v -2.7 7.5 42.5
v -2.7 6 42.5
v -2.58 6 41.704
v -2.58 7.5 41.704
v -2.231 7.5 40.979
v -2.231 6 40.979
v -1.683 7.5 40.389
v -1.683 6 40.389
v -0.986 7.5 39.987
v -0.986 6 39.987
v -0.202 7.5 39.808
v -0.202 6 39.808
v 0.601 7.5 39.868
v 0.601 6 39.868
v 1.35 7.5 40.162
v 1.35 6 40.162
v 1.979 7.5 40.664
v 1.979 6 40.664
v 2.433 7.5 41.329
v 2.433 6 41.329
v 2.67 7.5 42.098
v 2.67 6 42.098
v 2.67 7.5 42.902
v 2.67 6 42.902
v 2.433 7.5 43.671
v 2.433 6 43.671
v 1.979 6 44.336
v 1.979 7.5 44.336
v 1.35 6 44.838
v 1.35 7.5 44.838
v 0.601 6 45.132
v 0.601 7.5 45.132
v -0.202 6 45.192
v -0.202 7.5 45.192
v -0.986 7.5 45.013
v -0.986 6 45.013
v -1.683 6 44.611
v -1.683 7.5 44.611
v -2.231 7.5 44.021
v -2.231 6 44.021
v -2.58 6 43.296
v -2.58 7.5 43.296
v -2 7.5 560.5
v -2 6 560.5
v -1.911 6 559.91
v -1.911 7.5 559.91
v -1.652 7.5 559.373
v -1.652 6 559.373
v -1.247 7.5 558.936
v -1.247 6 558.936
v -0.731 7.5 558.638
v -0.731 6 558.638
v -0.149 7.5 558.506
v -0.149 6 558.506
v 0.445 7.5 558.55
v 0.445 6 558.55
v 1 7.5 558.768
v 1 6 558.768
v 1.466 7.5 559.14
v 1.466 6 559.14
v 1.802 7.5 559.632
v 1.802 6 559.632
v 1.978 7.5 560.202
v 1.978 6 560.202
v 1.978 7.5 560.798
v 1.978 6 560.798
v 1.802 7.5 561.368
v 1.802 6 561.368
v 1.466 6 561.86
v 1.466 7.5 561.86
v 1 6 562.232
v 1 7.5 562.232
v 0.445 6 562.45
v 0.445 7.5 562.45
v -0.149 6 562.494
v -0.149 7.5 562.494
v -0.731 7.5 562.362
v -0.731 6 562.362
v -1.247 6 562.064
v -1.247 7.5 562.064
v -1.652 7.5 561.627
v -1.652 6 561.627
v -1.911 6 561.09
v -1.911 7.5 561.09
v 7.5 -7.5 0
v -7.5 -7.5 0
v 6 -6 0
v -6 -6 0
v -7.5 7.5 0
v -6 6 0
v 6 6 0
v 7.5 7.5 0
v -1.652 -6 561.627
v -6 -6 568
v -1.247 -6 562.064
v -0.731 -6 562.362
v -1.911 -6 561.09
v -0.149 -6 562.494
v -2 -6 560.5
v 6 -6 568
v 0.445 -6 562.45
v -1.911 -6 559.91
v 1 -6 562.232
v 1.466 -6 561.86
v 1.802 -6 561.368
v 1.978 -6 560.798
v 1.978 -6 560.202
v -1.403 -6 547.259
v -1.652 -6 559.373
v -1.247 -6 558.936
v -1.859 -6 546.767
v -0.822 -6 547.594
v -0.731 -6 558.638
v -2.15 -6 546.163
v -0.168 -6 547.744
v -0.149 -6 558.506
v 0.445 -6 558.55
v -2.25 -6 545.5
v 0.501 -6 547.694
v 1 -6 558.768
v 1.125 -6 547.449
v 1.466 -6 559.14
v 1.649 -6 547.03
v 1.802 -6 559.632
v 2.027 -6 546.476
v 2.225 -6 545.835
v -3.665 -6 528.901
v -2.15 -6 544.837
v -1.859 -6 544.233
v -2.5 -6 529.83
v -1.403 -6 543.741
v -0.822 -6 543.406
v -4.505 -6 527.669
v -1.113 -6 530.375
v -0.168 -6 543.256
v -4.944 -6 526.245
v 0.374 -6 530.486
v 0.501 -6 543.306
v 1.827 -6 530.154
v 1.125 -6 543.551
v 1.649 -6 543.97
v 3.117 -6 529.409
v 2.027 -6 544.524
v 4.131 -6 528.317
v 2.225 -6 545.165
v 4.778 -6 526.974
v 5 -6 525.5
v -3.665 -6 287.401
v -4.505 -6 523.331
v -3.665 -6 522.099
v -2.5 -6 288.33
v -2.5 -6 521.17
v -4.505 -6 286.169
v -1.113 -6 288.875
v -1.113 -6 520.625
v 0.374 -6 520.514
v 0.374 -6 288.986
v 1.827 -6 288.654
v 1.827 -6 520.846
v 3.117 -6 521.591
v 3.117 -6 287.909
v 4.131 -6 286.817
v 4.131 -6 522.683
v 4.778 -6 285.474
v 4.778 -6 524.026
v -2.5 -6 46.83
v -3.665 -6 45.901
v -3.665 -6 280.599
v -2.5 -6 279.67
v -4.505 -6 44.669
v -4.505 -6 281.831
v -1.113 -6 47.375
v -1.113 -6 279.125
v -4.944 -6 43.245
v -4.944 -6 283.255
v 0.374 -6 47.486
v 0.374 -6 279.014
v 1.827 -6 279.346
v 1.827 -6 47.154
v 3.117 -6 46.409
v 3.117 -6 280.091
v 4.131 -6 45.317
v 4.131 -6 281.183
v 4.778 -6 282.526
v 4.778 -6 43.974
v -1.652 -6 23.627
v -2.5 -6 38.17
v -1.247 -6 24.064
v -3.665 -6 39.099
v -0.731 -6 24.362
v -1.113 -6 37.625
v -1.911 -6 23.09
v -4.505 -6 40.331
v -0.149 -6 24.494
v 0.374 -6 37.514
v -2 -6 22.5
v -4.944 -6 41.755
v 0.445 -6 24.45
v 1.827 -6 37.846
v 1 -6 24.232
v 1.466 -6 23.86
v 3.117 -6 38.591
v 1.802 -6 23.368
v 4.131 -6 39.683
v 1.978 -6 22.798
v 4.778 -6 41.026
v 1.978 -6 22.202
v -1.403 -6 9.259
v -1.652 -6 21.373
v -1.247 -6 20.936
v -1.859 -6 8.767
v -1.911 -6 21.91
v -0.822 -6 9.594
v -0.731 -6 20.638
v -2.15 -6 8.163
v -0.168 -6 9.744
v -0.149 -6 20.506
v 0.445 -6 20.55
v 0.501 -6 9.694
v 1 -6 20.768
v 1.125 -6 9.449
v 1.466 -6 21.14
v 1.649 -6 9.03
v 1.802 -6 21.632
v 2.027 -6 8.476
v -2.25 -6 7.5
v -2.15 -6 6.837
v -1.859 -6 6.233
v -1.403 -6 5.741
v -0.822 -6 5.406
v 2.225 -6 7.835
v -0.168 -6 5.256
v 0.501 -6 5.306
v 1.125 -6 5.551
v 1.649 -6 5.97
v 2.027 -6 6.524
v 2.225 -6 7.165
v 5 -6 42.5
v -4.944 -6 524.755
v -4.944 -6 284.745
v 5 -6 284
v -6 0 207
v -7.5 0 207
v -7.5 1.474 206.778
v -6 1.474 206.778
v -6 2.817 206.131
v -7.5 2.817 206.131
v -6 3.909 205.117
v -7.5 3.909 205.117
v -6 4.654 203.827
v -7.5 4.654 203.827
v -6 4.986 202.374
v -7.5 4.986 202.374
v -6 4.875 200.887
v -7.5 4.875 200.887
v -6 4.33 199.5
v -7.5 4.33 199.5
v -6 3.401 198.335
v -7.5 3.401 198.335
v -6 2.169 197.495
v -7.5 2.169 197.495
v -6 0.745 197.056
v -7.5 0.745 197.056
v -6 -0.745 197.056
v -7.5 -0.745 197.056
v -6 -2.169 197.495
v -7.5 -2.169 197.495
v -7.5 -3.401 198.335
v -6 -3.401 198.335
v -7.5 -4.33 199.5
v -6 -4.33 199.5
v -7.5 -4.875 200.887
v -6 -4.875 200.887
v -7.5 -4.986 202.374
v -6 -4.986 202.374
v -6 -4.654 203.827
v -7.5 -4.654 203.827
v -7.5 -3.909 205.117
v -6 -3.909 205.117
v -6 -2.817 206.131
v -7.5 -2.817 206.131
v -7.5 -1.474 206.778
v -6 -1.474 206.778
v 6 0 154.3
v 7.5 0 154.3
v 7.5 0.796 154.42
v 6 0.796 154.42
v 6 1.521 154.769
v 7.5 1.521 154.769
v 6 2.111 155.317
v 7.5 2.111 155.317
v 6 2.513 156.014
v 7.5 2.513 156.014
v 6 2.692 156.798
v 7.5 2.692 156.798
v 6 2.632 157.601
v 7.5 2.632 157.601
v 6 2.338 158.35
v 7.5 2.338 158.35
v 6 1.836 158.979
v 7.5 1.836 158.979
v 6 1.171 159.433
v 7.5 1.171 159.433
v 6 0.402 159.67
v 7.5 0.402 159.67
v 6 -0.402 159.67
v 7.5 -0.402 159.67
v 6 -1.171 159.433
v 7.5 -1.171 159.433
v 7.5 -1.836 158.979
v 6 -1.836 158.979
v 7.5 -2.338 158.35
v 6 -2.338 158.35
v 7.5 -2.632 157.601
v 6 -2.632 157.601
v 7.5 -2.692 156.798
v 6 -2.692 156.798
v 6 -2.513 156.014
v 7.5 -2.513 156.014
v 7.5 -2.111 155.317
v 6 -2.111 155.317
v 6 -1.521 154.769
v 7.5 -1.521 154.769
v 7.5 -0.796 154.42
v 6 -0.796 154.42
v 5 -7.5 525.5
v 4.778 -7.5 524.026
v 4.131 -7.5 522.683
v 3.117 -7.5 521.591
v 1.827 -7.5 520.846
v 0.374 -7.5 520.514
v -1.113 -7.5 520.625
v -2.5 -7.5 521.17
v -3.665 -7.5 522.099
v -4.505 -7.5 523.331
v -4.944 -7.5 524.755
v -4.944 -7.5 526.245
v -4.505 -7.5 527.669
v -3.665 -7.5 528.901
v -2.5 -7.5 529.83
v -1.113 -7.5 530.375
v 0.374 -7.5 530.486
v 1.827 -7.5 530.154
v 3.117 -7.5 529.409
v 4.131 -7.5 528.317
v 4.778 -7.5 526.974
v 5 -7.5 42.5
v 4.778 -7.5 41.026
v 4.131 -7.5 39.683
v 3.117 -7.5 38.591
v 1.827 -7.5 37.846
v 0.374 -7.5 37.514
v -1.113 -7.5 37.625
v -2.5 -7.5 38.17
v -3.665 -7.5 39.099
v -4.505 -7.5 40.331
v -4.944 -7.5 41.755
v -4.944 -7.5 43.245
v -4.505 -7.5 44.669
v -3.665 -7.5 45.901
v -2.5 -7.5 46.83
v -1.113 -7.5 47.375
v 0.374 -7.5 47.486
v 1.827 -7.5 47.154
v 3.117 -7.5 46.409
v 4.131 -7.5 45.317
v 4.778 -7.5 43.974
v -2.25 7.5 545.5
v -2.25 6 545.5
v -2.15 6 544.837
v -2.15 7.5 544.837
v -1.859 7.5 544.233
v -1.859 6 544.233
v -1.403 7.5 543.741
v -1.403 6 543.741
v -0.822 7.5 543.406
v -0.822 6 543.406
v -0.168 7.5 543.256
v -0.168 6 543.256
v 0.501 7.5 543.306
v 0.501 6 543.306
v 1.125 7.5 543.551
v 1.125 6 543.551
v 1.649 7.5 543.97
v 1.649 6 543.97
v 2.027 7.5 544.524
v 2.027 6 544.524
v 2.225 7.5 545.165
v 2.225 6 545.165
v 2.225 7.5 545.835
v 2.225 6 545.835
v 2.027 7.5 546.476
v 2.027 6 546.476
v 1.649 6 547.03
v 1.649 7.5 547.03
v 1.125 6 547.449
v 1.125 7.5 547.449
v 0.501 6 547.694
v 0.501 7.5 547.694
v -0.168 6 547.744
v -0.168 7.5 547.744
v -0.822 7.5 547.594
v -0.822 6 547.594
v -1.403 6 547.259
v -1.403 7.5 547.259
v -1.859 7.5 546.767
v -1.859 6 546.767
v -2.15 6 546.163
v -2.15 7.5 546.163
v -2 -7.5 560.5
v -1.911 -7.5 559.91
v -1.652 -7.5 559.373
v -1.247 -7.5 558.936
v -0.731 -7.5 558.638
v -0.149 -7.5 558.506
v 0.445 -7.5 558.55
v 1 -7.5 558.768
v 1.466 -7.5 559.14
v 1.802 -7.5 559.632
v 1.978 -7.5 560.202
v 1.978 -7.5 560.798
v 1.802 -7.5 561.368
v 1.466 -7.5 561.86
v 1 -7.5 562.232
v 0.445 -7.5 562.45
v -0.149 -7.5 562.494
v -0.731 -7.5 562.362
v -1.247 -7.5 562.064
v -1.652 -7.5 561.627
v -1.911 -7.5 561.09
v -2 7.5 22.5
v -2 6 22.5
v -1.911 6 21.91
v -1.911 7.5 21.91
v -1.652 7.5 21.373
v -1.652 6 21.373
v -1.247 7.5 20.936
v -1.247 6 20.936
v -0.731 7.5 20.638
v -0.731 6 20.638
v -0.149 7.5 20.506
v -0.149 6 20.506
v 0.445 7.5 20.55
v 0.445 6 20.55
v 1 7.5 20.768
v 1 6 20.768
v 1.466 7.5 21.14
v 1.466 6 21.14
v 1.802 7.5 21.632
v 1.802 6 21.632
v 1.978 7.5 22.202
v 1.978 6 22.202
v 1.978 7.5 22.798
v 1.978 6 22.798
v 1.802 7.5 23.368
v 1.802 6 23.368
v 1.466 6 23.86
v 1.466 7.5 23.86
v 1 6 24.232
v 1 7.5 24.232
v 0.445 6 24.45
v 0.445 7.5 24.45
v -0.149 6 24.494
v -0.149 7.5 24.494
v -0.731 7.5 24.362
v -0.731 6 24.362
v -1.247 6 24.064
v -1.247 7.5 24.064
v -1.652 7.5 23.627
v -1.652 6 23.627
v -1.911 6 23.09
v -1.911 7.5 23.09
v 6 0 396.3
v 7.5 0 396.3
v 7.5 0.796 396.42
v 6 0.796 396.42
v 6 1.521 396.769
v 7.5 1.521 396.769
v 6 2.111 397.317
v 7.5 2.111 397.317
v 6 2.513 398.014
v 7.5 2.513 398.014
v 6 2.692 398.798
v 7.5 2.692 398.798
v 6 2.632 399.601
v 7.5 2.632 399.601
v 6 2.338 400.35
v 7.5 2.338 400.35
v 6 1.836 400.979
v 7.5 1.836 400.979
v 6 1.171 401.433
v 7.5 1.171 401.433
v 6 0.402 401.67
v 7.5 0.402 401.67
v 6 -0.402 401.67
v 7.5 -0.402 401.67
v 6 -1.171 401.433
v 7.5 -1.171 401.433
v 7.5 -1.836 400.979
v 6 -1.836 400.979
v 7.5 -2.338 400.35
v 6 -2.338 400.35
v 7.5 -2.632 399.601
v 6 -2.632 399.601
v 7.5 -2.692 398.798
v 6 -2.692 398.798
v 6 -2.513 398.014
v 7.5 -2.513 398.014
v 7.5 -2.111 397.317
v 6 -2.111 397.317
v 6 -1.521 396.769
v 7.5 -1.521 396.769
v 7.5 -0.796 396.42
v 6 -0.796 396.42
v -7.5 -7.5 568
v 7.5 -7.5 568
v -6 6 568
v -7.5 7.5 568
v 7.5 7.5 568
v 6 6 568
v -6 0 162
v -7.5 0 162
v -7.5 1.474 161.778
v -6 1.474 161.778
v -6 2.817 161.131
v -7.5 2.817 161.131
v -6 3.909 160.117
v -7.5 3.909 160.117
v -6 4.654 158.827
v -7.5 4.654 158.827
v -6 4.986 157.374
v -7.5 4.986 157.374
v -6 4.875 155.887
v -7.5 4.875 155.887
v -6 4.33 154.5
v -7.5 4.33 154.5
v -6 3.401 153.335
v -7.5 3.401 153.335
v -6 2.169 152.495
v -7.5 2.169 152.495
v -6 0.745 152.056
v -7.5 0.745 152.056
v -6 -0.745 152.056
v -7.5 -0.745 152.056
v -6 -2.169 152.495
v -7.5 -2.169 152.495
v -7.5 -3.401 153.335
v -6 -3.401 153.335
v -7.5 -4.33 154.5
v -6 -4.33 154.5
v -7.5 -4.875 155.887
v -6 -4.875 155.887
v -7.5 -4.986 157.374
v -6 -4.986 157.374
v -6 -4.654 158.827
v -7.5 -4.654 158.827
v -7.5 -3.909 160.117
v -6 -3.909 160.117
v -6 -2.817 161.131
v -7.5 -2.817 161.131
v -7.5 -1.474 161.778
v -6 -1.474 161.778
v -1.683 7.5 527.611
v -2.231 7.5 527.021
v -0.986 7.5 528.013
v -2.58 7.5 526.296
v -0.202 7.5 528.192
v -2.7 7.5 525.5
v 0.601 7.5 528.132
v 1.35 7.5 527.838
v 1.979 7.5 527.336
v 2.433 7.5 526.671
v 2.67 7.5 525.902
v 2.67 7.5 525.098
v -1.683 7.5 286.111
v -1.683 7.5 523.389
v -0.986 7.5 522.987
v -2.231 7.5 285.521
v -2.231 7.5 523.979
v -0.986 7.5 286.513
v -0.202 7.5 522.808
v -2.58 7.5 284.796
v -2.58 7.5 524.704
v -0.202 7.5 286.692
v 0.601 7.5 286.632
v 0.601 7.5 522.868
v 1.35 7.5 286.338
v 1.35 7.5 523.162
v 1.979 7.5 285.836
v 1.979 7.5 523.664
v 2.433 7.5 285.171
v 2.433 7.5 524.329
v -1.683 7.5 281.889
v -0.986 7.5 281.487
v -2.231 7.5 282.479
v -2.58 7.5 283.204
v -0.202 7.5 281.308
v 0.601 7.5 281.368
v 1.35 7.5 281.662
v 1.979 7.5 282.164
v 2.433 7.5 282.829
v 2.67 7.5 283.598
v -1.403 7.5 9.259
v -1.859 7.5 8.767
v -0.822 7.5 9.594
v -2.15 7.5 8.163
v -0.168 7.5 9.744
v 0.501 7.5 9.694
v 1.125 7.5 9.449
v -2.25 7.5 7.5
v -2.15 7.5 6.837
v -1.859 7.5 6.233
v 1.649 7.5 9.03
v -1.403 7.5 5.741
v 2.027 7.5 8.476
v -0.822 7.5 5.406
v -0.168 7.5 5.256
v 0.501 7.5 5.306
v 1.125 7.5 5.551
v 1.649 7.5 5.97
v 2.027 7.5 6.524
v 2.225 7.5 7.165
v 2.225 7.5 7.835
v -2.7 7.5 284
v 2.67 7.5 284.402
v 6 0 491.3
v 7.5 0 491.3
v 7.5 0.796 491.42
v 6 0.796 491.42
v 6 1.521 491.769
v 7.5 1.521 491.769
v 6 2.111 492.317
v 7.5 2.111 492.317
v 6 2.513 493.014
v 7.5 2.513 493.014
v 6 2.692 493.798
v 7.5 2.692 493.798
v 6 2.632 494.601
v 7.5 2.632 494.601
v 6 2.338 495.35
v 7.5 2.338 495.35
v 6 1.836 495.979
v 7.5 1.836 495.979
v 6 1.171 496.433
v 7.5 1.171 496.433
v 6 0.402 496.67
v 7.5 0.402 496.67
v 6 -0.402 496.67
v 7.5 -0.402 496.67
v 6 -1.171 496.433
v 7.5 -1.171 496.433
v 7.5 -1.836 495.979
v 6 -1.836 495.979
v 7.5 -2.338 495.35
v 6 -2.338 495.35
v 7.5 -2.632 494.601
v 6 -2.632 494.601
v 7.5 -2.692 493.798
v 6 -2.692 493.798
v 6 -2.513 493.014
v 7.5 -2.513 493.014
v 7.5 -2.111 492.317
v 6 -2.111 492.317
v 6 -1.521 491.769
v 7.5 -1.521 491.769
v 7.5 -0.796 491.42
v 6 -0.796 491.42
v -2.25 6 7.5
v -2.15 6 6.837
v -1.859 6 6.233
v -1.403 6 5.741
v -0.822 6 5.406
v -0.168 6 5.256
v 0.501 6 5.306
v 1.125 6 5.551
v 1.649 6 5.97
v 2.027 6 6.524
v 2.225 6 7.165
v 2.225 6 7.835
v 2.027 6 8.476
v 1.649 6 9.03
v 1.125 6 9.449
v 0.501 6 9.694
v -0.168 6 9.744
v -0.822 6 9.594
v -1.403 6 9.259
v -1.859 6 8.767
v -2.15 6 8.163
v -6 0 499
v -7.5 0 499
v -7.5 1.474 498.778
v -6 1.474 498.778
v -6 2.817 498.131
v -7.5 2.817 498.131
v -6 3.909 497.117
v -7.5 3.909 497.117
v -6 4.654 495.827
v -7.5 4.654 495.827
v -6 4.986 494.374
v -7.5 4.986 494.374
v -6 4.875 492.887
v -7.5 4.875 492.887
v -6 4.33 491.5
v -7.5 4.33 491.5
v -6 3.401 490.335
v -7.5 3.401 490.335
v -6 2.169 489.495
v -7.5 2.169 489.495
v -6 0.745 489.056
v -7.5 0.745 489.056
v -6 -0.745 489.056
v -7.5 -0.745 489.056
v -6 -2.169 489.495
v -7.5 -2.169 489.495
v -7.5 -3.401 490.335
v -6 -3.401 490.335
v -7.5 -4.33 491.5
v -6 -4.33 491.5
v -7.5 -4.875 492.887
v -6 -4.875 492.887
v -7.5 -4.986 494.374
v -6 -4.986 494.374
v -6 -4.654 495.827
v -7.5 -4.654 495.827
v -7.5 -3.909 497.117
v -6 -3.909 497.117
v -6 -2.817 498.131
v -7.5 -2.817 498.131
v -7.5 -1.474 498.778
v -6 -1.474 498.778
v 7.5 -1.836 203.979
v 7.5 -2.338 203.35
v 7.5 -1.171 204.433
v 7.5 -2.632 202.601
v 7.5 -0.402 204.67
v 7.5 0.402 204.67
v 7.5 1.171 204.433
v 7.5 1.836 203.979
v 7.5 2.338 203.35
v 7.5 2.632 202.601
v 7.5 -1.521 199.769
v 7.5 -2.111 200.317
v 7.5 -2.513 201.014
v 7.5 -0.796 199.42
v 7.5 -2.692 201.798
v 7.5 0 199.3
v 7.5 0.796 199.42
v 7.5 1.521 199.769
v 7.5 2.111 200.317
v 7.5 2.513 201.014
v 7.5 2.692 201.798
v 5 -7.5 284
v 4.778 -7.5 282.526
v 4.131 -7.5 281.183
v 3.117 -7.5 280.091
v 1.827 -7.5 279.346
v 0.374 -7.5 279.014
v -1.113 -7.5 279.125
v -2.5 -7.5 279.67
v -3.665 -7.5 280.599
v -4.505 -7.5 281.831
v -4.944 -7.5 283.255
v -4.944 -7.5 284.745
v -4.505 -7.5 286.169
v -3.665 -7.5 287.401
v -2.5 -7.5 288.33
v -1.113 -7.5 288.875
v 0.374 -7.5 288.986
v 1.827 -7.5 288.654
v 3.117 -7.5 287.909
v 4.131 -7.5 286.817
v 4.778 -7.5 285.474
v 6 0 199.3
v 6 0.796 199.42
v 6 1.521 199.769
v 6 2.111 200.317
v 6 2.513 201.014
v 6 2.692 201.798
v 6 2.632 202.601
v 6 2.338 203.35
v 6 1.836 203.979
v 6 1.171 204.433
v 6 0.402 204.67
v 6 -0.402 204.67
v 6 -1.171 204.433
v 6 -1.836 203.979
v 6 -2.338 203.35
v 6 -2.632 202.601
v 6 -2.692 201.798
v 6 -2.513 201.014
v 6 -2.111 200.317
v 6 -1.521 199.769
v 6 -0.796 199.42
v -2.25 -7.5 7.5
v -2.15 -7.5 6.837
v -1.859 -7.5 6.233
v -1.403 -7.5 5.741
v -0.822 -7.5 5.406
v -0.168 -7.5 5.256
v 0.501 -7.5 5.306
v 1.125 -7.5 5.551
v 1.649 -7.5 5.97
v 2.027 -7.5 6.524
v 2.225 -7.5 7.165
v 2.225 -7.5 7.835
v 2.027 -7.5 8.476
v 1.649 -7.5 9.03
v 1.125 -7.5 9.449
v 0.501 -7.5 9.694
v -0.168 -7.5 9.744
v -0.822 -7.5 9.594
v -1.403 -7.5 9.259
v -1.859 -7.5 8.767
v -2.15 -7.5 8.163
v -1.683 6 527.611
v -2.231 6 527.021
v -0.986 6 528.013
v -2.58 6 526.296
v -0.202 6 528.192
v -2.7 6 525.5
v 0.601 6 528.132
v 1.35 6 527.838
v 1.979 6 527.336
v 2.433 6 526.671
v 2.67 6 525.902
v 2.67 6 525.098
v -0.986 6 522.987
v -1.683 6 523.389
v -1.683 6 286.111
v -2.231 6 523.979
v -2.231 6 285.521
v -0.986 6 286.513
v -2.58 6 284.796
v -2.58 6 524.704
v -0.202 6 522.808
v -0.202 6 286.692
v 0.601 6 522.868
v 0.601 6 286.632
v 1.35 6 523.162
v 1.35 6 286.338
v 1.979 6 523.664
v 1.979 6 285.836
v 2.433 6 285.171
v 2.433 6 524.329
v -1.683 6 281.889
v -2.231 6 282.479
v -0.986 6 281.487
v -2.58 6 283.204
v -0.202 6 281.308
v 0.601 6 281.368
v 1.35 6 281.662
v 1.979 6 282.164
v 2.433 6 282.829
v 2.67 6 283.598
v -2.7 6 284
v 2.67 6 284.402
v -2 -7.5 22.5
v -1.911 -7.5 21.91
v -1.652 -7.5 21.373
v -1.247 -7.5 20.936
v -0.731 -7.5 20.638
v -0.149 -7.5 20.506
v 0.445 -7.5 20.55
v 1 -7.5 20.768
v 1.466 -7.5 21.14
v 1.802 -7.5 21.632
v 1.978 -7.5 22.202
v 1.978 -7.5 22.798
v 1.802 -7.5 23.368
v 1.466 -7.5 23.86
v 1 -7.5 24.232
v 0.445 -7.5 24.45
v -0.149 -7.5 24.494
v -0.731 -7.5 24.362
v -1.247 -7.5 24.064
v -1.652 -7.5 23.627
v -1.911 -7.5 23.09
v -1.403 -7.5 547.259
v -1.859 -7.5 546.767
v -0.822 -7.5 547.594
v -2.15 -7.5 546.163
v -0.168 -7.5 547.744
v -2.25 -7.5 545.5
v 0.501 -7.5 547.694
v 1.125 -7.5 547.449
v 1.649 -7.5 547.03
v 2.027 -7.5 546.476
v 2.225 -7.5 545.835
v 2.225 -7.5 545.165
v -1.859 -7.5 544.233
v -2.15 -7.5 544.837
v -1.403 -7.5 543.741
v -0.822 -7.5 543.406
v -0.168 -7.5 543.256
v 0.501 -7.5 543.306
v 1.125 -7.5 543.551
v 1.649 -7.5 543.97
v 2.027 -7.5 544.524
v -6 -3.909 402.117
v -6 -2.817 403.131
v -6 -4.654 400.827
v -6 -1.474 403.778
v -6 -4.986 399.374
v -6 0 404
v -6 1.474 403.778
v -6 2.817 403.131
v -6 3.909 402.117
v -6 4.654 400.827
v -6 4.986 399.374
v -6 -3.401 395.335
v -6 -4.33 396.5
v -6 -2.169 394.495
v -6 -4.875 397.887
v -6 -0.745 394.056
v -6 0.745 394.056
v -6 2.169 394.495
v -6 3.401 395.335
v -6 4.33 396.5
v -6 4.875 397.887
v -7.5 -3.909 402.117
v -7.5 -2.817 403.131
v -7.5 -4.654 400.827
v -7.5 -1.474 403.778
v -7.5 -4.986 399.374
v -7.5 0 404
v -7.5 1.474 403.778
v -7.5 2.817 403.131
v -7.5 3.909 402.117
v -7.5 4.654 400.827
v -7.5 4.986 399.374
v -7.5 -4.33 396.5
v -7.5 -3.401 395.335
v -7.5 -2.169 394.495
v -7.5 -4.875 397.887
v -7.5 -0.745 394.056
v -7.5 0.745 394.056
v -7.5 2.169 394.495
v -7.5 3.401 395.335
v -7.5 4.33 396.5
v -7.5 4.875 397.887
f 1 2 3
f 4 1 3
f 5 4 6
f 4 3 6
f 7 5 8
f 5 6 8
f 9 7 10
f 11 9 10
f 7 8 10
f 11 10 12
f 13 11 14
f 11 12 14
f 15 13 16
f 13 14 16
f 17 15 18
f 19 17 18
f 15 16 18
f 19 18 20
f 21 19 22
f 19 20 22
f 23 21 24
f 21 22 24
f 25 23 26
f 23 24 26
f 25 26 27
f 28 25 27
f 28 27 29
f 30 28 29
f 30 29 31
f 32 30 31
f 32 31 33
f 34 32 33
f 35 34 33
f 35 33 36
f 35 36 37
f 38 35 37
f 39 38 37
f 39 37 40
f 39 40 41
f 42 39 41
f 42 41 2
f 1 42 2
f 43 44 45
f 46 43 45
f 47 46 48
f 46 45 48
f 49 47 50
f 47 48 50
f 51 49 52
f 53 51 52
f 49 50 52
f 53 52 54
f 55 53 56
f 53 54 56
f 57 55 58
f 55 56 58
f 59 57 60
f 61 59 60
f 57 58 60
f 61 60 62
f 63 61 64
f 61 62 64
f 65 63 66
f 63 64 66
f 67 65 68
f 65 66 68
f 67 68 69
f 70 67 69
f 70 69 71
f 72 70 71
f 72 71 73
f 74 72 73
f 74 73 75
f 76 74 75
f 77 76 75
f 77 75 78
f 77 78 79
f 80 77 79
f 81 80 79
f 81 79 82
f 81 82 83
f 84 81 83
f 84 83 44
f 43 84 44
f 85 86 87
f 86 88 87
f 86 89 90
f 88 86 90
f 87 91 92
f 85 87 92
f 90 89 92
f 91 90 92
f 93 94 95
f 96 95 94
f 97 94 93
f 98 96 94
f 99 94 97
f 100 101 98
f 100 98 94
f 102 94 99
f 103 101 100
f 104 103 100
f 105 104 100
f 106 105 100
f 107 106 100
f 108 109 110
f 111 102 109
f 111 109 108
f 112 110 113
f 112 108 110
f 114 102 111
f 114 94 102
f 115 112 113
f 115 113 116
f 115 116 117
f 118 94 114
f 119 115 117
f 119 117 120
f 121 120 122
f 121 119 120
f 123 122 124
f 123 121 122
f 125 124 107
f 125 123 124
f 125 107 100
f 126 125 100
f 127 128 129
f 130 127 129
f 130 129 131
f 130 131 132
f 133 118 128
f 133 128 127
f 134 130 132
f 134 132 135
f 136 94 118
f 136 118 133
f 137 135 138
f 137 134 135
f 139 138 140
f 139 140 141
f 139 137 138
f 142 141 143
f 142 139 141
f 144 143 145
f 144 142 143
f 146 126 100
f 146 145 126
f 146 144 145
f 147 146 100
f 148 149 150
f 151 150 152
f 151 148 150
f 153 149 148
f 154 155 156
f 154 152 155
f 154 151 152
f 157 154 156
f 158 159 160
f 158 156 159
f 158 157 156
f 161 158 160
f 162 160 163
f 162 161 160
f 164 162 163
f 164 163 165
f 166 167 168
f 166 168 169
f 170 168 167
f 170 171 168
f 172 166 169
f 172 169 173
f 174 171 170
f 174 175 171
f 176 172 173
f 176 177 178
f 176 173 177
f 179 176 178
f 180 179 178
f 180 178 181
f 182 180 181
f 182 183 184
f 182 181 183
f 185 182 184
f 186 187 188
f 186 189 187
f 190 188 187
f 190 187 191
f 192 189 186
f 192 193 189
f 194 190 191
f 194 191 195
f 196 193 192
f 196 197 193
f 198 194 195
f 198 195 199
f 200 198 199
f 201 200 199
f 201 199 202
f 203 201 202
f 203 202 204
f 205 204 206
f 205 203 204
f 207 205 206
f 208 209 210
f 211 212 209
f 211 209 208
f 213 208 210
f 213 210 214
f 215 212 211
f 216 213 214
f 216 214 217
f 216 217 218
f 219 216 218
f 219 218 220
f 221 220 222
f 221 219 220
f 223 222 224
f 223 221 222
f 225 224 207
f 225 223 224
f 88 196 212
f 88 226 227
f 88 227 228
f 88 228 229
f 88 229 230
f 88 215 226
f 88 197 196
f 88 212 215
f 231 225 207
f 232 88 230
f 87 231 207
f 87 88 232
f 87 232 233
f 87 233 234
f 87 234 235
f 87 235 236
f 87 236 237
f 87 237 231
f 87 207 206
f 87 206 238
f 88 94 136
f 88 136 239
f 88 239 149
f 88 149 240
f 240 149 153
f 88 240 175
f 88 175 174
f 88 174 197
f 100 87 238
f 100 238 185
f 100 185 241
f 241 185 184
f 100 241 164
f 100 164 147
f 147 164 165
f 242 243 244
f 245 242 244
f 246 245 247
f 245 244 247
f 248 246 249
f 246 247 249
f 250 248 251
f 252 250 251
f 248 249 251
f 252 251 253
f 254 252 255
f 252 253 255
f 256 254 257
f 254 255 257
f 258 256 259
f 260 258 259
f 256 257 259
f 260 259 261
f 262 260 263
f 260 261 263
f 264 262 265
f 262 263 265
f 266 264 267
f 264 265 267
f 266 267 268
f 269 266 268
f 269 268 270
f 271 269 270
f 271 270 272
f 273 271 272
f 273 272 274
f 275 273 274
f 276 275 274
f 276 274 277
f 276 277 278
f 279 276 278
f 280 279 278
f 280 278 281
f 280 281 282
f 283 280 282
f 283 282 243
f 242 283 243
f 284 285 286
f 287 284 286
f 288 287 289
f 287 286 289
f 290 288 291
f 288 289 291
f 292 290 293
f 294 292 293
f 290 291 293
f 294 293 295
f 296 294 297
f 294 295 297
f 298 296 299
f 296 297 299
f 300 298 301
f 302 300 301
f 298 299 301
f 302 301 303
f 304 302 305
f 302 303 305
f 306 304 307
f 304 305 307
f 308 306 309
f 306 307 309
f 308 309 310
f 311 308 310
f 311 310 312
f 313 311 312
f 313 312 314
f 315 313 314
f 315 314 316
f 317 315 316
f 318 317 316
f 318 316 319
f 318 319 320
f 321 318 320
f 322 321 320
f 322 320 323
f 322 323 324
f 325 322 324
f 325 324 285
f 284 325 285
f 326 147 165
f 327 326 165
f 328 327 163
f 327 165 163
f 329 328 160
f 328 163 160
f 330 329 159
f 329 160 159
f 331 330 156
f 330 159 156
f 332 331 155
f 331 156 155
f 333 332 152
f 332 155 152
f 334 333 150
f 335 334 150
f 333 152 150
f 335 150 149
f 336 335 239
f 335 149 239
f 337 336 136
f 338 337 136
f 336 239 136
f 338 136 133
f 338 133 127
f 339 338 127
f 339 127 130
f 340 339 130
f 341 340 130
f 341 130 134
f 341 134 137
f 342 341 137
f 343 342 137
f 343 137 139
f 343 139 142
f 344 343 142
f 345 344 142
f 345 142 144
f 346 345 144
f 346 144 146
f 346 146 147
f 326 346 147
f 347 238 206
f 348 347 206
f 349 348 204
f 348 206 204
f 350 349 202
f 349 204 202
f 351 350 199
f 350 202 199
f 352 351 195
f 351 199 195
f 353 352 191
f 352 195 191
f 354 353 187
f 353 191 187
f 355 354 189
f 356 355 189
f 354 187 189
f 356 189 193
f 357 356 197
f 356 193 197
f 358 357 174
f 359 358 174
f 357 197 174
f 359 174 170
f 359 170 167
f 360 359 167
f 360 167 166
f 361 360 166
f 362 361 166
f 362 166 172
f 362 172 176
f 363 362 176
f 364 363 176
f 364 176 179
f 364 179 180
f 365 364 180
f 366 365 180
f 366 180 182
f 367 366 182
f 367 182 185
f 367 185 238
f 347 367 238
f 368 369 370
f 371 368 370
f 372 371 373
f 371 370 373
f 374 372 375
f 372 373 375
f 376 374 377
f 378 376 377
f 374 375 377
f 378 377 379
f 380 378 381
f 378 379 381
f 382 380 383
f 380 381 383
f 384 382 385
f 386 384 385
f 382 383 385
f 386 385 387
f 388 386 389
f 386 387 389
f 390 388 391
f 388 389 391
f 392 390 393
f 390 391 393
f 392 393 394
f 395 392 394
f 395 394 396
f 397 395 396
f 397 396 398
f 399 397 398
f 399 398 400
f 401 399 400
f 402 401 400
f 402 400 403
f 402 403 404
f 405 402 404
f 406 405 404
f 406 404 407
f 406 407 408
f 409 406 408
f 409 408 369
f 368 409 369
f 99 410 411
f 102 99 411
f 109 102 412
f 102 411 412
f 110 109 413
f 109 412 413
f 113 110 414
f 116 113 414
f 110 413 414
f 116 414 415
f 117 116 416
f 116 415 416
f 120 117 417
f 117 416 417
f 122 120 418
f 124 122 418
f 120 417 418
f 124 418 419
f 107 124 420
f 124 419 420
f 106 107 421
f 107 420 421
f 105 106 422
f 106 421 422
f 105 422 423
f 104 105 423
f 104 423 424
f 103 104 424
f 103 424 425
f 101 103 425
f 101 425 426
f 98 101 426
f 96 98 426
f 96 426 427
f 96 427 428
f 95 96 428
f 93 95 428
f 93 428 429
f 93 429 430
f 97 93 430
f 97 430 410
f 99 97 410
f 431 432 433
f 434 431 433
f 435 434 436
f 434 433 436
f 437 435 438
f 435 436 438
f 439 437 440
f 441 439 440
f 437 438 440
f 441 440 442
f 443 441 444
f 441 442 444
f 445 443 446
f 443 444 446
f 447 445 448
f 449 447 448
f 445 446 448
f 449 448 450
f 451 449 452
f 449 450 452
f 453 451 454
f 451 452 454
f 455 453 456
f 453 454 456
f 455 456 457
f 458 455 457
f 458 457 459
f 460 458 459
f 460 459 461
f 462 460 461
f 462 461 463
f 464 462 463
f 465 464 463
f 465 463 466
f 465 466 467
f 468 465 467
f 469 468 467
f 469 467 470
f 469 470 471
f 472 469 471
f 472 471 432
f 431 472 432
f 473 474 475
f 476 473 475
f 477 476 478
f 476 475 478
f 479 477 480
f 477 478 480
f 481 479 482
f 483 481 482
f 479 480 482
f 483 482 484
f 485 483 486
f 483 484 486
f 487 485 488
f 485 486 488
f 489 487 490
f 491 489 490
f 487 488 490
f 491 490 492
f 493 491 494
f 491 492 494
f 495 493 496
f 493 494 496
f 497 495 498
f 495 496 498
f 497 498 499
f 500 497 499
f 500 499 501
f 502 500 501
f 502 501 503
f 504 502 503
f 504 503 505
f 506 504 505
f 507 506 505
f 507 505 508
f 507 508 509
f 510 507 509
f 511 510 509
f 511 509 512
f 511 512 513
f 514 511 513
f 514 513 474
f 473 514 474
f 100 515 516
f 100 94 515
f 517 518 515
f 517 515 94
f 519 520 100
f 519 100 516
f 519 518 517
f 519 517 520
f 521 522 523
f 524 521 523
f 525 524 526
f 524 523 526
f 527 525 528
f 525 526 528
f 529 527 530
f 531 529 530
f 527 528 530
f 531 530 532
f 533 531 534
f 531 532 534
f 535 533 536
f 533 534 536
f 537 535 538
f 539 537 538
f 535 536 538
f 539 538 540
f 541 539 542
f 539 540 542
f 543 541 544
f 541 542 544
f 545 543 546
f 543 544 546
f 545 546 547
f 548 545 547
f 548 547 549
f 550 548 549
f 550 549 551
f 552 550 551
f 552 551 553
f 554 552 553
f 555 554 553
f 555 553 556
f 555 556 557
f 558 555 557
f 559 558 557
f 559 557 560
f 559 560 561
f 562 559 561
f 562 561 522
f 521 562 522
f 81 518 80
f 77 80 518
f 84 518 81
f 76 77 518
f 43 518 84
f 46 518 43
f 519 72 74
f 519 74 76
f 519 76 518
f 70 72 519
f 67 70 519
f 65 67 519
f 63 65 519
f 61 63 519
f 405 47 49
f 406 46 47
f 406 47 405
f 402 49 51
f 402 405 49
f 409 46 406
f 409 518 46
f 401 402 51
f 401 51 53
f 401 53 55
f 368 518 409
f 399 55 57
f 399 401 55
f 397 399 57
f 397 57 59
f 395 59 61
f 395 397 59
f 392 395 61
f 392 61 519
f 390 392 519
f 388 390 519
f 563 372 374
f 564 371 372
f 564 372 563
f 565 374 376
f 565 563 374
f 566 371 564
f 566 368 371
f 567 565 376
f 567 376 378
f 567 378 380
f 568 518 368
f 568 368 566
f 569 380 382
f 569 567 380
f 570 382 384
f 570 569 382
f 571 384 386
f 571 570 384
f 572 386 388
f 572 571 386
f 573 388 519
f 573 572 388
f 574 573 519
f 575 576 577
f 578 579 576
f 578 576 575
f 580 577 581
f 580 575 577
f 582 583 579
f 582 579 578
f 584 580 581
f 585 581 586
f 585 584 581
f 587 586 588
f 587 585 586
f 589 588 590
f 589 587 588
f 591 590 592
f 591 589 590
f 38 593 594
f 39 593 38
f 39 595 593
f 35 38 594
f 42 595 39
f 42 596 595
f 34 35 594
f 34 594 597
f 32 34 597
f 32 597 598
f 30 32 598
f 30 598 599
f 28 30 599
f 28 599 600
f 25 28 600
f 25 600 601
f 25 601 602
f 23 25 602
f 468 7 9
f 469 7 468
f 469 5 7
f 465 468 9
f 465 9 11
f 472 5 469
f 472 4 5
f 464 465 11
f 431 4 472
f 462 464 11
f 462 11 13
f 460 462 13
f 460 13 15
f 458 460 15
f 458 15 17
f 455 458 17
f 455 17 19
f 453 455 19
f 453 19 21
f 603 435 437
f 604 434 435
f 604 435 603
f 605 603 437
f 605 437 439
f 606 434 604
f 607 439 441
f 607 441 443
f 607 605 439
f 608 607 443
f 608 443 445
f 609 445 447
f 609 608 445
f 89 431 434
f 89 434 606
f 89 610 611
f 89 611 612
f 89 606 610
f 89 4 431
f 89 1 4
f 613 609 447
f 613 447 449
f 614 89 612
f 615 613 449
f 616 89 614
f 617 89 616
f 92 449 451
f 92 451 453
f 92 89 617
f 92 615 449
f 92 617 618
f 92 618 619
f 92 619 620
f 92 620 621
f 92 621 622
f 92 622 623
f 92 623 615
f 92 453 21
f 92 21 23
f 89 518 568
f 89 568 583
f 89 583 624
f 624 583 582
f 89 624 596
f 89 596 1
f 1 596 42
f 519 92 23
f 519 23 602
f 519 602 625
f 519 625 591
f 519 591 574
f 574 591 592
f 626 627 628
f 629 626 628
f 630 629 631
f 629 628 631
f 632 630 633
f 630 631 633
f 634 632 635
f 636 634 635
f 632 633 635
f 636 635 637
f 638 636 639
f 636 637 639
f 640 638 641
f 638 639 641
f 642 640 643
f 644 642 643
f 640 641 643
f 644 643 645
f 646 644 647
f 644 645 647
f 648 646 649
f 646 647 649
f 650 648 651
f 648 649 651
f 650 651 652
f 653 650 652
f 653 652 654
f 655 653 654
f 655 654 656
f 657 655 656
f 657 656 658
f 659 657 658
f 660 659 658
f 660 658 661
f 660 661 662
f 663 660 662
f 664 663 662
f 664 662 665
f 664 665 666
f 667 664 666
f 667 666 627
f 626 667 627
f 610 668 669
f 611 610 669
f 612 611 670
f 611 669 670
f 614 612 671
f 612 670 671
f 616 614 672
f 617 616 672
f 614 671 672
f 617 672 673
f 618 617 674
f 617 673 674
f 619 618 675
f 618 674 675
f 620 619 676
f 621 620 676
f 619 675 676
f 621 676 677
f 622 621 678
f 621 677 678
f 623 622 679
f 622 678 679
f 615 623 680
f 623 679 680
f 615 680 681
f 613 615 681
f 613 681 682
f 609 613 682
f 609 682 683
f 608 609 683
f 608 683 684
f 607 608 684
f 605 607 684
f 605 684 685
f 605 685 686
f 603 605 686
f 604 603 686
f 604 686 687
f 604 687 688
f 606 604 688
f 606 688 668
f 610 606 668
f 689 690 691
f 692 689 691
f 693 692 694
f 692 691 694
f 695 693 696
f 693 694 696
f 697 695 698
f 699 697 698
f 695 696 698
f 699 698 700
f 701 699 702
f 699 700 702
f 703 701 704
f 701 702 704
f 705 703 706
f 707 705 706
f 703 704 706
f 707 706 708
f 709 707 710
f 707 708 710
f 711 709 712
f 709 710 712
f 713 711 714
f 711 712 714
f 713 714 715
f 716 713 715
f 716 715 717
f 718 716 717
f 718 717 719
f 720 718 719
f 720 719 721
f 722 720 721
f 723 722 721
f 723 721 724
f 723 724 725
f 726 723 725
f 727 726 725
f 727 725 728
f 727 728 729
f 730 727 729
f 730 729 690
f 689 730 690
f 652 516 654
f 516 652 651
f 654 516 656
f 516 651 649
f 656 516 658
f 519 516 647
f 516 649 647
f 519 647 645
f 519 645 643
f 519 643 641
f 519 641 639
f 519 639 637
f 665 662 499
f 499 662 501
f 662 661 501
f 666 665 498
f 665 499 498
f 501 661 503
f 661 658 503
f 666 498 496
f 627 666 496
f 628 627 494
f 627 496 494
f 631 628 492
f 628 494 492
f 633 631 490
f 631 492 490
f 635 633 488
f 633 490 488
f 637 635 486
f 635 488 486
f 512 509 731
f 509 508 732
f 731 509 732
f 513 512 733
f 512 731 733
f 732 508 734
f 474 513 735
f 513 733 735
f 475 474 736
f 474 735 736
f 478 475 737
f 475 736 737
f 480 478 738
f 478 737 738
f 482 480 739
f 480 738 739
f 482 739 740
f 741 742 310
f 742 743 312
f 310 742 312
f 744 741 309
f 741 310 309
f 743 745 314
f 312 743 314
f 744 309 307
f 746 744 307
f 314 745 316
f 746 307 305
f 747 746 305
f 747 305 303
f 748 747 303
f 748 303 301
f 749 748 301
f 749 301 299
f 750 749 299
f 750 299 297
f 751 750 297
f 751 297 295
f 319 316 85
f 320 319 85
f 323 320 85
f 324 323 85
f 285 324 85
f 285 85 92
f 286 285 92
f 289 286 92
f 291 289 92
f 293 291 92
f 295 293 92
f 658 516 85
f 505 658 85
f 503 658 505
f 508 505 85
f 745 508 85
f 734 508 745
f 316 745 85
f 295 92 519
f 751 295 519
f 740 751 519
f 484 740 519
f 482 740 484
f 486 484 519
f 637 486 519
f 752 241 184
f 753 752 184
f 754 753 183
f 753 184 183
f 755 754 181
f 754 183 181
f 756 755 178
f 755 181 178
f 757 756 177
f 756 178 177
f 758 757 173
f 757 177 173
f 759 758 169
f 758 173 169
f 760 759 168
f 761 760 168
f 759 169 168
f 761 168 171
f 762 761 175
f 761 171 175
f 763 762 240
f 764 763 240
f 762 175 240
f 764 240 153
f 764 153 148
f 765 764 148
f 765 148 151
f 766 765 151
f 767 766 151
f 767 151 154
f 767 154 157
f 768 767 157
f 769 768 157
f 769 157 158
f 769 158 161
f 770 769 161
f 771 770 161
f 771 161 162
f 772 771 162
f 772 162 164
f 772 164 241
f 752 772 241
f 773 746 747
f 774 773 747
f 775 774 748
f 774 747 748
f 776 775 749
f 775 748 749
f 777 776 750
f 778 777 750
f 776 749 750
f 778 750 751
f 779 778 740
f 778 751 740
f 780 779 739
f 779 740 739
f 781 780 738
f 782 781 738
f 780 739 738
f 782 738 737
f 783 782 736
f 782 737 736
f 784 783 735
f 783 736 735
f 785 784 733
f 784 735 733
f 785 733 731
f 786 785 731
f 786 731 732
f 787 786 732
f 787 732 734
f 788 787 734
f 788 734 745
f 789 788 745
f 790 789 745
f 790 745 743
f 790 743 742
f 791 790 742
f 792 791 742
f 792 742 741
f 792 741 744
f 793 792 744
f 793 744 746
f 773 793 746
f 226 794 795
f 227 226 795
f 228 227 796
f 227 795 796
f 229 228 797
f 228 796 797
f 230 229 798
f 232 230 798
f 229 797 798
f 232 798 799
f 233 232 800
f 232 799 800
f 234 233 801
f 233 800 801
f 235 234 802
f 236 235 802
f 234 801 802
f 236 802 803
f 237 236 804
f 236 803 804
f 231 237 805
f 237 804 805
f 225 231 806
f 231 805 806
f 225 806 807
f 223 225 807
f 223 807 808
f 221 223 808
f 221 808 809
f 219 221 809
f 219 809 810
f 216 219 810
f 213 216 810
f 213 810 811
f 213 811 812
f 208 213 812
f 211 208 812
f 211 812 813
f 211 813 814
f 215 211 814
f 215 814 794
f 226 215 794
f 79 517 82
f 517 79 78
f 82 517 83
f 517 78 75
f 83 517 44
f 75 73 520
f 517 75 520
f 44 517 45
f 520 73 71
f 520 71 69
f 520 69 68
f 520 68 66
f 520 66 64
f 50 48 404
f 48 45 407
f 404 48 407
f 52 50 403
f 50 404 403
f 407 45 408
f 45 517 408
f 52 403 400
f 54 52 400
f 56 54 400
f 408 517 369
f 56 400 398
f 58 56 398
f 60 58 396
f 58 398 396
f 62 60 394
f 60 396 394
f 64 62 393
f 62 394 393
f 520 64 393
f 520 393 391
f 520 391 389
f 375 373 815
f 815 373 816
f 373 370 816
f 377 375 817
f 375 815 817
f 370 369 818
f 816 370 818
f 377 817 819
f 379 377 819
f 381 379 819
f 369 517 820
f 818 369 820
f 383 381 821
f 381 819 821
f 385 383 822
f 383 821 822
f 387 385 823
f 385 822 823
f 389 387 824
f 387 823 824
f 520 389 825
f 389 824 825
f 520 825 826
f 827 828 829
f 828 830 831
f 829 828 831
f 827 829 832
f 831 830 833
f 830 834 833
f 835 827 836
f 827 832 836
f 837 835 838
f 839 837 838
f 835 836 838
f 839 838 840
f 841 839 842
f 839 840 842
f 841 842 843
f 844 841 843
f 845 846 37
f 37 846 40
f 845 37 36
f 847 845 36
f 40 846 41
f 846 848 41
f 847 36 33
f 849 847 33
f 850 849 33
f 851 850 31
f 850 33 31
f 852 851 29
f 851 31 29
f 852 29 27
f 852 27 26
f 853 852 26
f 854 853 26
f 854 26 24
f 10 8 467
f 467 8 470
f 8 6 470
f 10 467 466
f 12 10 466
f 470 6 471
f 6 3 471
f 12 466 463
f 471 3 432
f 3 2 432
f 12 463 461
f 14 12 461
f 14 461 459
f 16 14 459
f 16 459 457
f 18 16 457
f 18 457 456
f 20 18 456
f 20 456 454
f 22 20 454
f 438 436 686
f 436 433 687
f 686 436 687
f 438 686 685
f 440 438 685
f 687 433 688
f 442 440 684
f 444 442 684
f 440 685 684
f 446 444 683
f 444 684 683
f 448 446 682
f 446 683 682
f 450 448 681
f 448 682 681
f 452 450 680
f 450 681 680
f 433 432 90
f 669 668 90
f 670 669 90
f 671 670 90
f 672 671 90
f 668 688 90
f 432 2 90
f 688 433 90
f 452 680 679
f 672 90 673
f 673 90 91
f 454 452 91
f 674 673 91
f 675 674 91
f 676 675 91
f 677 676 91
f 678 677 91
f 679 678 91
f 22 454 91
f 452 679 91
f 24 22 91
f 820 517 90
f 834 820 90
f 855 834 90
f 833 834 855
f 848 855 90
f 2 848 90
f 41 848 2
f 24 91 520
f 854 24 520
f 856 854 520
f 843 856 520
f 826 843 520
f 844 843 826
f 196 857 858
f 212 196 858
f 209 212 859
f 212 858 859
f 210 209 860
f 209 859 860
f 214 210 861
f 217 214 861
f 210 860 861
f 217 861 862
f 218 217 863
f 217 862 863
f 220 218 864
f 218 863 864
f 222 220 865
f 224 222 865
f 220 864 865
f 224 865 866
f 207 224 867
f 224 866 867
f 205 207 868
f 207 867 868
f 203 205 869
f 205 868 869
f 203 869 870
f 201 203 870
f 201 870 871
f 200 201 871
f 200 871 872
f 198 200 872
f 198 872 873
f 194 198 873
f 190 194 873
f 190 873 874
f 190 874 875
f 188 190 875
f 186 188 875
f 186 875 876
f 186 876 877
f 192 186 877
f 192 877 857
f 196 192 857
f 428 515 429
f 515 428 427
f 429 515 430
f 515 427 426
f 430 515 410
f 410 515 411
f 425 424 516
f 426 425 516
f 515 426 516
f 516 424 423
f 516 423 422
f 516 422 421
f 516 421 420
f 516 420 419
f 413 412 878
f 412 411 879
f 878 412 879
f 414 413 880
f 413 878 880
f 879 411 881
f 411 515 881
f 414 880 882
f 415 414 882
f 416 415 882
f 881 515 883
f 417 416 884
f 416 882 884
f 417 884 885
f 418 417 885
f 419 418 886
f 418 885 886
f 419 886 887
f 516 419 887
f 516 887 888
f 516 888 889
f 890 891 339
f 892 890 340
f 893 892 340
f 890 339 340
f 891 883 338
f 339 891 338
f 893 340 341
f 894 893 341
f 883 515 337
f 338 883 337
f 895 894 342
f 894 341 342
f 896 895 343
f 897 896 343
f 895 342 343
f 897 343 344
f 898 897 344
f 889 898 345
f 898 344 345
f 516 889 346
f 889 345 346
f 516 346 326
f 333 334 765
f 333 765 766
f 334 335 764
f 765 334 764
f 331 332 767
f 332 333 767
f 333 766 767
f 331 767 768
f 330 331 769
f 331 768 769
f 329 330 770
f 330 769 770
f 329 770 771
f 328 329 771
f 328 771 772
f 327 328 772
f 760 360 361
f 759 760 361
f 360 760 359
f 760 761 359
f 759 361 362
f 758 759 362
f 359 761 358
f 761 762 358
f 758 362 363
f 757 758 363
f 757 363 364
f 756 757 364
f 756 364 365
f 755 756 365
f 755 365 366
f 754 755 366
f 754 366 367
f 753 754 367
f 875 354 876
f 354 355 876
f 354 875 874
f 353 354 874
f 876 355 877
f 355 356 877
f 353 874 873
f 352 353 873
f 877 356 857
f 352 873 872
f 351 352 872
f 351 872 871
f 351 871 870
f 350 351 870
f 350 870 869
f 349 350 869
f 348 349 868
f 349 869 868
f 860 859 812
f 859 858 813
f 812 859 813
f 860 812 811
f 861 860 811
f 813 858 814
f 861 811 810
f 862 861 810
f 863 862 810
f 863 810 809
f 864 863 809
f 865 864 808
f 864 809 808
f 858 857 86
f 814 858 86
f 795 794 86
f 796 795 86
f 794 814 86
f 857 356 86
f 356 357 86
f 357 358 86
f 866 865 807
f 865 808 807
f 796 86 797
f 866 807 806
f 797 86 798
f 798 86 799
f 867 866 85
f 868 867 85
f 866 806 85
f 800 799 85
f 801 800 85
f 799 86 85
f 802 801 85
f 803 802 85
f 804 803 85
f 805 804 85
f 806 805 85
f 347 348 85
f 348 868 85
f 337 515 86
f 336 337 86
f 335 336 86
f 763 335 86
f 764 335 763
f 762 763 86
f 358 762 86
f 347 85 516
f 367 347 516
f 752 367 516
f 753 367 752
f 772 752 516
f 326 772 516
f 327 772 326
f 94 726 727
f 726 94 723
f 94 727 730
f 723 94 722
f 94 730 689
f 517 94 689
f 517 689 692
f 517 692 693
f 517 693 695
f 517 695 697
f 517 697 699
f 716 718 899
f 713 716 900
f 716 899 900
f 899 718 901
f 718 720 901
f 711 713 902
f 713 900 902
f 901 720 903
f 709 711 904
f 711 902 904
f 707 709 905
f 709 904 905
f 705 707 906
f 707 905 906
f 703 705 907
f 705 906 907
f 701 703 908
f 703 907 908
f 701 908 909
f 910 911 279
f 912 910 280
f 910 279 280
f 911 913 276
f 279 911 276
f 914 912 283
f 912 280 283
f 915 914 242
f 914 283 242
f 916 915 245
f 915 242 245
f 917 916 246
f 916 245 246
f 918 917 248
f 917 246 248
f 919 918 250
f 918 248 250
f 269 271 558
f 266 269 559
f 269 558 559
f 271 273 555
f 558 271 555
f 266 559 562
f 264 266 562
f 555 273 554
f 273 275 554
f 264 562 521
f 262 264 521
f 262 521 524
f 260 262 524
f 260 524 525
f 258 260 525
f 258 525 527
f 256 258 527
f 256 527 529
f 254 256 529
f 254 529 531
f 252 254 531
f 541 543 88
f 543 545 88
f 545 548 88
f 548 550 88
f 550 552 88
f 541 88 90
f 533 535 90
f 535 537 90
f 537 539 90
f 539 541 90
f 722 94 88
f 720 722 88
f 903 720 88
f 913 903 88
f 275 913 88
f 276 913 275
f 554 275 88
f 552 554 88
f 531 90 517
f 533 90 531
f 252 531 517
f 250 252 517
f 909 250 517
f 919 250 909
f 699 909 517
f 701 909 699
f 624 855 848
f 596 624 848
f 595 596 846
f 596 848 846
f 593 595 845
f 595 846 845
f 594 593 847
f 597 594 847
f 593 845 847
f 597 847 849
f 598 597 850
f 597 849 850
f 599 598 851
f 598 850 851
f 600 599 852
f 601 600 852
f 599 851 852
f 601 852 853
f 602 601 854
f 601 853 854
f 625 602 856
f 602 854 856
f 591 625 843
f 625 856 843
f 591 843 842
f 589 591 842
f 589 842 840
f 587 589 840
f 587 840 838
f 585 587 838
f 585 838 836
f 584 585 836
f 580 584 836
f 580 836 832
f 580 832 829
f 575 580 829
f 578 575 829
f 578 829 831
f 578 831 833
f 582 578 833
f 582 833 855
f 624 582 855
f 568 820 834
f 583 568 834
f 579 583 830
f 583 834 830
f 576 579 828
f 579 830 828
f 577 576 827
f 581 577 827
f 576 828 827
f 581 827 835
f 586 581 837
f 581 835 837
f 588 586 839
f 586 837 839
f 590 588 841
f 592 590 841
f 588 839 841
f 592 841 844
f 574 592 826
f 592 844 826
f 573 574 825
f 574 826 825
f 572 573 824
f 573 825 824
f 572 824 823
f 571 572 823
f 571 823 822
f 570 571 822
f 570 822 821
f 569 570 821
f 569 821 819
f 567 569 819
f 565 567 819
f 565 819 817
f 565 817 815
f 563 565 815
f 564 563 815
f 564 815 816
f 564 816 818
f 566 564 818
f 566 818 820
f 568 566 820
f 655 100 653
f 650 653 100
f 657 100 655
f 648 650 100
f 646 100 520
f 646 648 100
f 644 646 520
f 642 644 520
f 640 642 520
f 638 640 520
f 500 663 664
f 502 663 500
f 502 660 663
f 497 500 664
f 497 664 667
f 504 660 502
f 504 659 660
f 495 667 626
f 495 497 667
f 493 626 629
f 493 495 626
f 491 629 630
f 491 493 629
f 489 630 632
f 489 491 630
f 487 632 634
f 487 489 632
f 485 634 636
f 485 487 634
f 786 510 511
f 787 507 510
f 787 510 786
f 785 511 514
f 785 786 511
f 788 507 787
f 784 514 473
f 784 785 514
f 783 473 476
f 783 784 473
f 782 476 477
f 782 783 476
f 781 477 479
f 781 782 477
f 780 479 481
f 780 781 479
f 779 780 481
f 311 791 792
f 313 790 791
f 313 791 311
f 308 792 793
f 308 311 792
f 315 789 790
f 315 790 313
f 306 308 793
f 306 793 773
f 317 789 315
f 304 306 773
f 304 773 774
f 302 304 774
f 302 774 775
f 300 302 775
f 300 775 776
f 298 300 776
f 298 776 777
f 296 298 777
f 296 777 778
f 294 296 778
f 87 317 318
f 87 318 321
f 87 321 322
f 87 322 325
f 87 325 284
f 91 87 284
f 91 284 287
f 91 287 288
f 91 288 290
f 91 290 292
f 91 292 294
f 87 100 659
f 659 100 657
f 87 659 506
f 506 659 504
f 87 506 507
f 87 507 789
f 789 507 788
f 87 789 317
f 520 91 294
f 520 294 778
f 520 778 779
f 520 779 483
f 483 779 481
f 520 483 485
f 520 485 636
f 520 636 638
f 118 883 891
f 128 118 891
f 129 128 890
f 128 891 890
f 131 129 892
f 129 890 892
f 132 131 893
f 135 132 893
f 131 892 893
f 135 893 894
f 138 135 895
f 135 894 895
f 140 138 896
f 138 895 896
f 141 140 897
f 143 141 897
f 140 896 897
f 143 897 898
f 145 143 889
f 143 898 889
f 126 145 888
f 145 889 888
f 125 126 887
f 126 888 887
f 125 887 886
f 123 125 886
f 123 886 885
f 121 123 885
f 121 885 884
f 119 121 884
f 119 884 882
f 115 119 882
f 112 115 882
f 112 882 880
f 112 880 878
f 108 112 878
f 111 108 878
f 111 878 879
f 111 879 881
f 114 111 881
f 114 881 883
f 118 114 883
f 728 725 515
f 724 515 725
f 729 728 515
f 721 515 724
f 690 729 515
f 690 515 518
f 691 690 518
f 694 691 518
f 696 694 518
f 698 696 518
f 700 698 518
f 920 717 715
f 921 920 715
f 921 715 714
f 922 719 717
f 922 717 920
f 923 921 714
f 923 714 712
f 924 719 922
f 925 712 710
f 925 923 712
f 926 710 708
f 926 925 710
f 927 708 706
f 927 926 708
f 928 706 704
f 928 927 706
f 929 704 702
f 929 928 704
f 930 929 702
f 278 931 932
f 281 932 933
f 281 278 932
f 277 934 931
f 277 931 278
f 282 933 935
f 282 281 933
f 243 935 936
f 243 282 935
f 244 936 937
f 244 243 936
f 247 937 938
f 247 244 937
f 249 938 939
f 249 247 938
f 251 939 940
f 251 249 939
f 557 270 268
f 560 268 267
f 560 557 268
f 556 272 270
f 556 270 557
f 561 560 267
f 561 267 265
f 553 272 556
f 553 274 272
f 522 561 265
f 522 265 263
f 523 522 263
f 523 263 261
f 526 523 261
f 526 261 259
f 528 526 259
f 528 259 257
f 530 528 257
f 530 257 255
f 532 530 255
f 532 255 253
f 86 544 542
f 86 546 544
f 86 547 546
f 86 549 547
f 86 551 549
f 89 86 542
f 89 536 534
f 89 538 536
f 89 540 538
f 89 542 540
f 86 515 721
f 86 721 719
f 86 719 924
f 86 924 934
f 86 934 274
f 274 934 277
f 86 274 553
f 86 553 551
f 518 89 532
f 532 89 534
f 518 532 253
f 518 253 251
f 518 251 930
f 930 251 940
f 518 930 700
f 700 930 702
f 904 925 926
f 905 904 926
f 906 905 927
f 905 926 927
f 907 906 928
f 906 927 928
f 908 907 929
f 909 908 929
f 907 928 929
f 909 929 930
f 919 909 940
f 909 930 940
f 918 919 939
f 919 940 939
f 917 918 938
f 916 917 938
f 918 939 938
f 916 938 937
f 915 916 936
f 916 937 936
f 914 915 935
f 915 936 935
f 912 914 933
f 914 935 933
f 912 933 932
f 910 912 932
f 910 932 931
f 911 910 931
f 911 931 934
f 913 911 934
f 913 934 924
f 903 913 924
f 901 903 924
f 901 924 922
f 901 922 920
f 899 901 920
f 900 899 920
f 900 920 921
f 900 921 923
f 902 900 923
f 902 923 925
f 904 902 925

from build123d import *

# Parameters (mm, degrees)
SKETCH_1_W                  = 15
SKETCH_1_H                  = 15
SKETCH_1_W_2                = 12
SKETCH_1_H_2                = 12
EXTRUDE_1_DEPTH             = 568
SKETCH_5_R                  = 2
SKETCH_5_R_2                = 2.25
SKETCH_5_R_3                = 2.7
CUT_EXTRUDE_4_DEPTH         = 20
SKETCH_9_R                  = 2.7
CUT_EXTRUDE_6_DEPTH         = 40
SKETCH_10_R                 = 5
CUT_EXTRUDE_7_DEPTH         = 5
HOLE_WIZARD_10_0_10_2_D     = 10
HOLE_WIZARD_10_0_10_2_DEPTH = 1.5


with BuildPart() as part:
    # ｽｹｯﾁ1 → ﾎﾞｽ - 押し出し1 (new body)
    with BuildSketch(Plane.XY):
        Rectangle(SKETCH_1_W, SKETCH_1_H)
        Rectangle(SKETCH_1_W_2, SKETCH_1_H_2, mode=Mode.SUBTRACT)
    extrude(amount=EXTRUDE_1_DEPTH)

    # ｽｹｯﾁ5 → ｶｯﾄ - 押し出し4 (cut)
    with BuildSketch(Plane(origin=(0, -7.5, 0), x_dir=(-1, 0, 0), z_dir=(0, -1, 0))):
        with Locations((0, -22.5)):
            Circle(SKETCH_5_R)
        with Locations((0, -7.5)):
            Circle(SKETCH_5_R_2)
        with Locations((0, -560.5)):
            Circle(SKETCH_5_R)
        with Locations((0, -545.5)):
            Circle(SKETCH_5_R_2)
        with Locations((0, -42.5)):
            Circle(SKETCH_5_R_3)
        with Locations((0, -284)):
            Circle(SKETCH_5_R_3)
        with Locations((0, -525.5)):
            Circle(SKETCH_5_R_3)
    extrude(amount=-CUT_EXTRUDE_4_DEPTH, mode=Mode.SUBTRACT)

    # ｽｹｯﾁ9 → ｶｯﾄ - 押し出し6 (cut)
    with BuildSketch(Plane(origin=(7.5, 0, 0), x_dir=(0, 0, -1), z_dir=(1, 0, 0))):
        with Locations((-494, 0)):
            Circle(SKETCH_9_R)
        with Locations((-399, 0)):
            Circle(SKETCH_9_R)
        with Locations((-202, 0)):
            Circle(SKETCH_9_R)
        with Locations((-157, 0)):
            Circle(SKETCH_9_R)
    extrude(amount=-CUT_EXTRUDE_6_DEPTH, mode=Mode.SUBTRACT)

    # ｽｹｯﾁ10 → ｶｯﾄ - 押し出し7 (cut)
    with BuildSketch(Plane.ZY.offset(7.5)):
        with Locations((157, 0)):
            Circle(SKETCH_10_R)
        with Locations((202, 0)):
            Circle(SKETCH_10_R)
        with Locations((399, 0)):
            Circle(SKETCH_10_R)
        with Locations((494, 0)):
            Circle(SKETCH_10_R)
    extrude(amount=-CUT_EXTRUDE_7_DEPTH, mode=Mode.SUBTRACT)

    # Ø10.0 (10) 直径の穴2
    with Locations(Plane(origin=(0, -7.5, 0), x_dir=(-1, 0, 0), z_dir=(0, -1, 0))):
        with Locations((0, -42.5), (0, -284), (0, -525.5)):
            Hole(HOLE_WIZARD_10_0_10_2_D / 2, depth=HOLE_WIZARD_10_0_10_2_DEPTH)


solid = part.part
